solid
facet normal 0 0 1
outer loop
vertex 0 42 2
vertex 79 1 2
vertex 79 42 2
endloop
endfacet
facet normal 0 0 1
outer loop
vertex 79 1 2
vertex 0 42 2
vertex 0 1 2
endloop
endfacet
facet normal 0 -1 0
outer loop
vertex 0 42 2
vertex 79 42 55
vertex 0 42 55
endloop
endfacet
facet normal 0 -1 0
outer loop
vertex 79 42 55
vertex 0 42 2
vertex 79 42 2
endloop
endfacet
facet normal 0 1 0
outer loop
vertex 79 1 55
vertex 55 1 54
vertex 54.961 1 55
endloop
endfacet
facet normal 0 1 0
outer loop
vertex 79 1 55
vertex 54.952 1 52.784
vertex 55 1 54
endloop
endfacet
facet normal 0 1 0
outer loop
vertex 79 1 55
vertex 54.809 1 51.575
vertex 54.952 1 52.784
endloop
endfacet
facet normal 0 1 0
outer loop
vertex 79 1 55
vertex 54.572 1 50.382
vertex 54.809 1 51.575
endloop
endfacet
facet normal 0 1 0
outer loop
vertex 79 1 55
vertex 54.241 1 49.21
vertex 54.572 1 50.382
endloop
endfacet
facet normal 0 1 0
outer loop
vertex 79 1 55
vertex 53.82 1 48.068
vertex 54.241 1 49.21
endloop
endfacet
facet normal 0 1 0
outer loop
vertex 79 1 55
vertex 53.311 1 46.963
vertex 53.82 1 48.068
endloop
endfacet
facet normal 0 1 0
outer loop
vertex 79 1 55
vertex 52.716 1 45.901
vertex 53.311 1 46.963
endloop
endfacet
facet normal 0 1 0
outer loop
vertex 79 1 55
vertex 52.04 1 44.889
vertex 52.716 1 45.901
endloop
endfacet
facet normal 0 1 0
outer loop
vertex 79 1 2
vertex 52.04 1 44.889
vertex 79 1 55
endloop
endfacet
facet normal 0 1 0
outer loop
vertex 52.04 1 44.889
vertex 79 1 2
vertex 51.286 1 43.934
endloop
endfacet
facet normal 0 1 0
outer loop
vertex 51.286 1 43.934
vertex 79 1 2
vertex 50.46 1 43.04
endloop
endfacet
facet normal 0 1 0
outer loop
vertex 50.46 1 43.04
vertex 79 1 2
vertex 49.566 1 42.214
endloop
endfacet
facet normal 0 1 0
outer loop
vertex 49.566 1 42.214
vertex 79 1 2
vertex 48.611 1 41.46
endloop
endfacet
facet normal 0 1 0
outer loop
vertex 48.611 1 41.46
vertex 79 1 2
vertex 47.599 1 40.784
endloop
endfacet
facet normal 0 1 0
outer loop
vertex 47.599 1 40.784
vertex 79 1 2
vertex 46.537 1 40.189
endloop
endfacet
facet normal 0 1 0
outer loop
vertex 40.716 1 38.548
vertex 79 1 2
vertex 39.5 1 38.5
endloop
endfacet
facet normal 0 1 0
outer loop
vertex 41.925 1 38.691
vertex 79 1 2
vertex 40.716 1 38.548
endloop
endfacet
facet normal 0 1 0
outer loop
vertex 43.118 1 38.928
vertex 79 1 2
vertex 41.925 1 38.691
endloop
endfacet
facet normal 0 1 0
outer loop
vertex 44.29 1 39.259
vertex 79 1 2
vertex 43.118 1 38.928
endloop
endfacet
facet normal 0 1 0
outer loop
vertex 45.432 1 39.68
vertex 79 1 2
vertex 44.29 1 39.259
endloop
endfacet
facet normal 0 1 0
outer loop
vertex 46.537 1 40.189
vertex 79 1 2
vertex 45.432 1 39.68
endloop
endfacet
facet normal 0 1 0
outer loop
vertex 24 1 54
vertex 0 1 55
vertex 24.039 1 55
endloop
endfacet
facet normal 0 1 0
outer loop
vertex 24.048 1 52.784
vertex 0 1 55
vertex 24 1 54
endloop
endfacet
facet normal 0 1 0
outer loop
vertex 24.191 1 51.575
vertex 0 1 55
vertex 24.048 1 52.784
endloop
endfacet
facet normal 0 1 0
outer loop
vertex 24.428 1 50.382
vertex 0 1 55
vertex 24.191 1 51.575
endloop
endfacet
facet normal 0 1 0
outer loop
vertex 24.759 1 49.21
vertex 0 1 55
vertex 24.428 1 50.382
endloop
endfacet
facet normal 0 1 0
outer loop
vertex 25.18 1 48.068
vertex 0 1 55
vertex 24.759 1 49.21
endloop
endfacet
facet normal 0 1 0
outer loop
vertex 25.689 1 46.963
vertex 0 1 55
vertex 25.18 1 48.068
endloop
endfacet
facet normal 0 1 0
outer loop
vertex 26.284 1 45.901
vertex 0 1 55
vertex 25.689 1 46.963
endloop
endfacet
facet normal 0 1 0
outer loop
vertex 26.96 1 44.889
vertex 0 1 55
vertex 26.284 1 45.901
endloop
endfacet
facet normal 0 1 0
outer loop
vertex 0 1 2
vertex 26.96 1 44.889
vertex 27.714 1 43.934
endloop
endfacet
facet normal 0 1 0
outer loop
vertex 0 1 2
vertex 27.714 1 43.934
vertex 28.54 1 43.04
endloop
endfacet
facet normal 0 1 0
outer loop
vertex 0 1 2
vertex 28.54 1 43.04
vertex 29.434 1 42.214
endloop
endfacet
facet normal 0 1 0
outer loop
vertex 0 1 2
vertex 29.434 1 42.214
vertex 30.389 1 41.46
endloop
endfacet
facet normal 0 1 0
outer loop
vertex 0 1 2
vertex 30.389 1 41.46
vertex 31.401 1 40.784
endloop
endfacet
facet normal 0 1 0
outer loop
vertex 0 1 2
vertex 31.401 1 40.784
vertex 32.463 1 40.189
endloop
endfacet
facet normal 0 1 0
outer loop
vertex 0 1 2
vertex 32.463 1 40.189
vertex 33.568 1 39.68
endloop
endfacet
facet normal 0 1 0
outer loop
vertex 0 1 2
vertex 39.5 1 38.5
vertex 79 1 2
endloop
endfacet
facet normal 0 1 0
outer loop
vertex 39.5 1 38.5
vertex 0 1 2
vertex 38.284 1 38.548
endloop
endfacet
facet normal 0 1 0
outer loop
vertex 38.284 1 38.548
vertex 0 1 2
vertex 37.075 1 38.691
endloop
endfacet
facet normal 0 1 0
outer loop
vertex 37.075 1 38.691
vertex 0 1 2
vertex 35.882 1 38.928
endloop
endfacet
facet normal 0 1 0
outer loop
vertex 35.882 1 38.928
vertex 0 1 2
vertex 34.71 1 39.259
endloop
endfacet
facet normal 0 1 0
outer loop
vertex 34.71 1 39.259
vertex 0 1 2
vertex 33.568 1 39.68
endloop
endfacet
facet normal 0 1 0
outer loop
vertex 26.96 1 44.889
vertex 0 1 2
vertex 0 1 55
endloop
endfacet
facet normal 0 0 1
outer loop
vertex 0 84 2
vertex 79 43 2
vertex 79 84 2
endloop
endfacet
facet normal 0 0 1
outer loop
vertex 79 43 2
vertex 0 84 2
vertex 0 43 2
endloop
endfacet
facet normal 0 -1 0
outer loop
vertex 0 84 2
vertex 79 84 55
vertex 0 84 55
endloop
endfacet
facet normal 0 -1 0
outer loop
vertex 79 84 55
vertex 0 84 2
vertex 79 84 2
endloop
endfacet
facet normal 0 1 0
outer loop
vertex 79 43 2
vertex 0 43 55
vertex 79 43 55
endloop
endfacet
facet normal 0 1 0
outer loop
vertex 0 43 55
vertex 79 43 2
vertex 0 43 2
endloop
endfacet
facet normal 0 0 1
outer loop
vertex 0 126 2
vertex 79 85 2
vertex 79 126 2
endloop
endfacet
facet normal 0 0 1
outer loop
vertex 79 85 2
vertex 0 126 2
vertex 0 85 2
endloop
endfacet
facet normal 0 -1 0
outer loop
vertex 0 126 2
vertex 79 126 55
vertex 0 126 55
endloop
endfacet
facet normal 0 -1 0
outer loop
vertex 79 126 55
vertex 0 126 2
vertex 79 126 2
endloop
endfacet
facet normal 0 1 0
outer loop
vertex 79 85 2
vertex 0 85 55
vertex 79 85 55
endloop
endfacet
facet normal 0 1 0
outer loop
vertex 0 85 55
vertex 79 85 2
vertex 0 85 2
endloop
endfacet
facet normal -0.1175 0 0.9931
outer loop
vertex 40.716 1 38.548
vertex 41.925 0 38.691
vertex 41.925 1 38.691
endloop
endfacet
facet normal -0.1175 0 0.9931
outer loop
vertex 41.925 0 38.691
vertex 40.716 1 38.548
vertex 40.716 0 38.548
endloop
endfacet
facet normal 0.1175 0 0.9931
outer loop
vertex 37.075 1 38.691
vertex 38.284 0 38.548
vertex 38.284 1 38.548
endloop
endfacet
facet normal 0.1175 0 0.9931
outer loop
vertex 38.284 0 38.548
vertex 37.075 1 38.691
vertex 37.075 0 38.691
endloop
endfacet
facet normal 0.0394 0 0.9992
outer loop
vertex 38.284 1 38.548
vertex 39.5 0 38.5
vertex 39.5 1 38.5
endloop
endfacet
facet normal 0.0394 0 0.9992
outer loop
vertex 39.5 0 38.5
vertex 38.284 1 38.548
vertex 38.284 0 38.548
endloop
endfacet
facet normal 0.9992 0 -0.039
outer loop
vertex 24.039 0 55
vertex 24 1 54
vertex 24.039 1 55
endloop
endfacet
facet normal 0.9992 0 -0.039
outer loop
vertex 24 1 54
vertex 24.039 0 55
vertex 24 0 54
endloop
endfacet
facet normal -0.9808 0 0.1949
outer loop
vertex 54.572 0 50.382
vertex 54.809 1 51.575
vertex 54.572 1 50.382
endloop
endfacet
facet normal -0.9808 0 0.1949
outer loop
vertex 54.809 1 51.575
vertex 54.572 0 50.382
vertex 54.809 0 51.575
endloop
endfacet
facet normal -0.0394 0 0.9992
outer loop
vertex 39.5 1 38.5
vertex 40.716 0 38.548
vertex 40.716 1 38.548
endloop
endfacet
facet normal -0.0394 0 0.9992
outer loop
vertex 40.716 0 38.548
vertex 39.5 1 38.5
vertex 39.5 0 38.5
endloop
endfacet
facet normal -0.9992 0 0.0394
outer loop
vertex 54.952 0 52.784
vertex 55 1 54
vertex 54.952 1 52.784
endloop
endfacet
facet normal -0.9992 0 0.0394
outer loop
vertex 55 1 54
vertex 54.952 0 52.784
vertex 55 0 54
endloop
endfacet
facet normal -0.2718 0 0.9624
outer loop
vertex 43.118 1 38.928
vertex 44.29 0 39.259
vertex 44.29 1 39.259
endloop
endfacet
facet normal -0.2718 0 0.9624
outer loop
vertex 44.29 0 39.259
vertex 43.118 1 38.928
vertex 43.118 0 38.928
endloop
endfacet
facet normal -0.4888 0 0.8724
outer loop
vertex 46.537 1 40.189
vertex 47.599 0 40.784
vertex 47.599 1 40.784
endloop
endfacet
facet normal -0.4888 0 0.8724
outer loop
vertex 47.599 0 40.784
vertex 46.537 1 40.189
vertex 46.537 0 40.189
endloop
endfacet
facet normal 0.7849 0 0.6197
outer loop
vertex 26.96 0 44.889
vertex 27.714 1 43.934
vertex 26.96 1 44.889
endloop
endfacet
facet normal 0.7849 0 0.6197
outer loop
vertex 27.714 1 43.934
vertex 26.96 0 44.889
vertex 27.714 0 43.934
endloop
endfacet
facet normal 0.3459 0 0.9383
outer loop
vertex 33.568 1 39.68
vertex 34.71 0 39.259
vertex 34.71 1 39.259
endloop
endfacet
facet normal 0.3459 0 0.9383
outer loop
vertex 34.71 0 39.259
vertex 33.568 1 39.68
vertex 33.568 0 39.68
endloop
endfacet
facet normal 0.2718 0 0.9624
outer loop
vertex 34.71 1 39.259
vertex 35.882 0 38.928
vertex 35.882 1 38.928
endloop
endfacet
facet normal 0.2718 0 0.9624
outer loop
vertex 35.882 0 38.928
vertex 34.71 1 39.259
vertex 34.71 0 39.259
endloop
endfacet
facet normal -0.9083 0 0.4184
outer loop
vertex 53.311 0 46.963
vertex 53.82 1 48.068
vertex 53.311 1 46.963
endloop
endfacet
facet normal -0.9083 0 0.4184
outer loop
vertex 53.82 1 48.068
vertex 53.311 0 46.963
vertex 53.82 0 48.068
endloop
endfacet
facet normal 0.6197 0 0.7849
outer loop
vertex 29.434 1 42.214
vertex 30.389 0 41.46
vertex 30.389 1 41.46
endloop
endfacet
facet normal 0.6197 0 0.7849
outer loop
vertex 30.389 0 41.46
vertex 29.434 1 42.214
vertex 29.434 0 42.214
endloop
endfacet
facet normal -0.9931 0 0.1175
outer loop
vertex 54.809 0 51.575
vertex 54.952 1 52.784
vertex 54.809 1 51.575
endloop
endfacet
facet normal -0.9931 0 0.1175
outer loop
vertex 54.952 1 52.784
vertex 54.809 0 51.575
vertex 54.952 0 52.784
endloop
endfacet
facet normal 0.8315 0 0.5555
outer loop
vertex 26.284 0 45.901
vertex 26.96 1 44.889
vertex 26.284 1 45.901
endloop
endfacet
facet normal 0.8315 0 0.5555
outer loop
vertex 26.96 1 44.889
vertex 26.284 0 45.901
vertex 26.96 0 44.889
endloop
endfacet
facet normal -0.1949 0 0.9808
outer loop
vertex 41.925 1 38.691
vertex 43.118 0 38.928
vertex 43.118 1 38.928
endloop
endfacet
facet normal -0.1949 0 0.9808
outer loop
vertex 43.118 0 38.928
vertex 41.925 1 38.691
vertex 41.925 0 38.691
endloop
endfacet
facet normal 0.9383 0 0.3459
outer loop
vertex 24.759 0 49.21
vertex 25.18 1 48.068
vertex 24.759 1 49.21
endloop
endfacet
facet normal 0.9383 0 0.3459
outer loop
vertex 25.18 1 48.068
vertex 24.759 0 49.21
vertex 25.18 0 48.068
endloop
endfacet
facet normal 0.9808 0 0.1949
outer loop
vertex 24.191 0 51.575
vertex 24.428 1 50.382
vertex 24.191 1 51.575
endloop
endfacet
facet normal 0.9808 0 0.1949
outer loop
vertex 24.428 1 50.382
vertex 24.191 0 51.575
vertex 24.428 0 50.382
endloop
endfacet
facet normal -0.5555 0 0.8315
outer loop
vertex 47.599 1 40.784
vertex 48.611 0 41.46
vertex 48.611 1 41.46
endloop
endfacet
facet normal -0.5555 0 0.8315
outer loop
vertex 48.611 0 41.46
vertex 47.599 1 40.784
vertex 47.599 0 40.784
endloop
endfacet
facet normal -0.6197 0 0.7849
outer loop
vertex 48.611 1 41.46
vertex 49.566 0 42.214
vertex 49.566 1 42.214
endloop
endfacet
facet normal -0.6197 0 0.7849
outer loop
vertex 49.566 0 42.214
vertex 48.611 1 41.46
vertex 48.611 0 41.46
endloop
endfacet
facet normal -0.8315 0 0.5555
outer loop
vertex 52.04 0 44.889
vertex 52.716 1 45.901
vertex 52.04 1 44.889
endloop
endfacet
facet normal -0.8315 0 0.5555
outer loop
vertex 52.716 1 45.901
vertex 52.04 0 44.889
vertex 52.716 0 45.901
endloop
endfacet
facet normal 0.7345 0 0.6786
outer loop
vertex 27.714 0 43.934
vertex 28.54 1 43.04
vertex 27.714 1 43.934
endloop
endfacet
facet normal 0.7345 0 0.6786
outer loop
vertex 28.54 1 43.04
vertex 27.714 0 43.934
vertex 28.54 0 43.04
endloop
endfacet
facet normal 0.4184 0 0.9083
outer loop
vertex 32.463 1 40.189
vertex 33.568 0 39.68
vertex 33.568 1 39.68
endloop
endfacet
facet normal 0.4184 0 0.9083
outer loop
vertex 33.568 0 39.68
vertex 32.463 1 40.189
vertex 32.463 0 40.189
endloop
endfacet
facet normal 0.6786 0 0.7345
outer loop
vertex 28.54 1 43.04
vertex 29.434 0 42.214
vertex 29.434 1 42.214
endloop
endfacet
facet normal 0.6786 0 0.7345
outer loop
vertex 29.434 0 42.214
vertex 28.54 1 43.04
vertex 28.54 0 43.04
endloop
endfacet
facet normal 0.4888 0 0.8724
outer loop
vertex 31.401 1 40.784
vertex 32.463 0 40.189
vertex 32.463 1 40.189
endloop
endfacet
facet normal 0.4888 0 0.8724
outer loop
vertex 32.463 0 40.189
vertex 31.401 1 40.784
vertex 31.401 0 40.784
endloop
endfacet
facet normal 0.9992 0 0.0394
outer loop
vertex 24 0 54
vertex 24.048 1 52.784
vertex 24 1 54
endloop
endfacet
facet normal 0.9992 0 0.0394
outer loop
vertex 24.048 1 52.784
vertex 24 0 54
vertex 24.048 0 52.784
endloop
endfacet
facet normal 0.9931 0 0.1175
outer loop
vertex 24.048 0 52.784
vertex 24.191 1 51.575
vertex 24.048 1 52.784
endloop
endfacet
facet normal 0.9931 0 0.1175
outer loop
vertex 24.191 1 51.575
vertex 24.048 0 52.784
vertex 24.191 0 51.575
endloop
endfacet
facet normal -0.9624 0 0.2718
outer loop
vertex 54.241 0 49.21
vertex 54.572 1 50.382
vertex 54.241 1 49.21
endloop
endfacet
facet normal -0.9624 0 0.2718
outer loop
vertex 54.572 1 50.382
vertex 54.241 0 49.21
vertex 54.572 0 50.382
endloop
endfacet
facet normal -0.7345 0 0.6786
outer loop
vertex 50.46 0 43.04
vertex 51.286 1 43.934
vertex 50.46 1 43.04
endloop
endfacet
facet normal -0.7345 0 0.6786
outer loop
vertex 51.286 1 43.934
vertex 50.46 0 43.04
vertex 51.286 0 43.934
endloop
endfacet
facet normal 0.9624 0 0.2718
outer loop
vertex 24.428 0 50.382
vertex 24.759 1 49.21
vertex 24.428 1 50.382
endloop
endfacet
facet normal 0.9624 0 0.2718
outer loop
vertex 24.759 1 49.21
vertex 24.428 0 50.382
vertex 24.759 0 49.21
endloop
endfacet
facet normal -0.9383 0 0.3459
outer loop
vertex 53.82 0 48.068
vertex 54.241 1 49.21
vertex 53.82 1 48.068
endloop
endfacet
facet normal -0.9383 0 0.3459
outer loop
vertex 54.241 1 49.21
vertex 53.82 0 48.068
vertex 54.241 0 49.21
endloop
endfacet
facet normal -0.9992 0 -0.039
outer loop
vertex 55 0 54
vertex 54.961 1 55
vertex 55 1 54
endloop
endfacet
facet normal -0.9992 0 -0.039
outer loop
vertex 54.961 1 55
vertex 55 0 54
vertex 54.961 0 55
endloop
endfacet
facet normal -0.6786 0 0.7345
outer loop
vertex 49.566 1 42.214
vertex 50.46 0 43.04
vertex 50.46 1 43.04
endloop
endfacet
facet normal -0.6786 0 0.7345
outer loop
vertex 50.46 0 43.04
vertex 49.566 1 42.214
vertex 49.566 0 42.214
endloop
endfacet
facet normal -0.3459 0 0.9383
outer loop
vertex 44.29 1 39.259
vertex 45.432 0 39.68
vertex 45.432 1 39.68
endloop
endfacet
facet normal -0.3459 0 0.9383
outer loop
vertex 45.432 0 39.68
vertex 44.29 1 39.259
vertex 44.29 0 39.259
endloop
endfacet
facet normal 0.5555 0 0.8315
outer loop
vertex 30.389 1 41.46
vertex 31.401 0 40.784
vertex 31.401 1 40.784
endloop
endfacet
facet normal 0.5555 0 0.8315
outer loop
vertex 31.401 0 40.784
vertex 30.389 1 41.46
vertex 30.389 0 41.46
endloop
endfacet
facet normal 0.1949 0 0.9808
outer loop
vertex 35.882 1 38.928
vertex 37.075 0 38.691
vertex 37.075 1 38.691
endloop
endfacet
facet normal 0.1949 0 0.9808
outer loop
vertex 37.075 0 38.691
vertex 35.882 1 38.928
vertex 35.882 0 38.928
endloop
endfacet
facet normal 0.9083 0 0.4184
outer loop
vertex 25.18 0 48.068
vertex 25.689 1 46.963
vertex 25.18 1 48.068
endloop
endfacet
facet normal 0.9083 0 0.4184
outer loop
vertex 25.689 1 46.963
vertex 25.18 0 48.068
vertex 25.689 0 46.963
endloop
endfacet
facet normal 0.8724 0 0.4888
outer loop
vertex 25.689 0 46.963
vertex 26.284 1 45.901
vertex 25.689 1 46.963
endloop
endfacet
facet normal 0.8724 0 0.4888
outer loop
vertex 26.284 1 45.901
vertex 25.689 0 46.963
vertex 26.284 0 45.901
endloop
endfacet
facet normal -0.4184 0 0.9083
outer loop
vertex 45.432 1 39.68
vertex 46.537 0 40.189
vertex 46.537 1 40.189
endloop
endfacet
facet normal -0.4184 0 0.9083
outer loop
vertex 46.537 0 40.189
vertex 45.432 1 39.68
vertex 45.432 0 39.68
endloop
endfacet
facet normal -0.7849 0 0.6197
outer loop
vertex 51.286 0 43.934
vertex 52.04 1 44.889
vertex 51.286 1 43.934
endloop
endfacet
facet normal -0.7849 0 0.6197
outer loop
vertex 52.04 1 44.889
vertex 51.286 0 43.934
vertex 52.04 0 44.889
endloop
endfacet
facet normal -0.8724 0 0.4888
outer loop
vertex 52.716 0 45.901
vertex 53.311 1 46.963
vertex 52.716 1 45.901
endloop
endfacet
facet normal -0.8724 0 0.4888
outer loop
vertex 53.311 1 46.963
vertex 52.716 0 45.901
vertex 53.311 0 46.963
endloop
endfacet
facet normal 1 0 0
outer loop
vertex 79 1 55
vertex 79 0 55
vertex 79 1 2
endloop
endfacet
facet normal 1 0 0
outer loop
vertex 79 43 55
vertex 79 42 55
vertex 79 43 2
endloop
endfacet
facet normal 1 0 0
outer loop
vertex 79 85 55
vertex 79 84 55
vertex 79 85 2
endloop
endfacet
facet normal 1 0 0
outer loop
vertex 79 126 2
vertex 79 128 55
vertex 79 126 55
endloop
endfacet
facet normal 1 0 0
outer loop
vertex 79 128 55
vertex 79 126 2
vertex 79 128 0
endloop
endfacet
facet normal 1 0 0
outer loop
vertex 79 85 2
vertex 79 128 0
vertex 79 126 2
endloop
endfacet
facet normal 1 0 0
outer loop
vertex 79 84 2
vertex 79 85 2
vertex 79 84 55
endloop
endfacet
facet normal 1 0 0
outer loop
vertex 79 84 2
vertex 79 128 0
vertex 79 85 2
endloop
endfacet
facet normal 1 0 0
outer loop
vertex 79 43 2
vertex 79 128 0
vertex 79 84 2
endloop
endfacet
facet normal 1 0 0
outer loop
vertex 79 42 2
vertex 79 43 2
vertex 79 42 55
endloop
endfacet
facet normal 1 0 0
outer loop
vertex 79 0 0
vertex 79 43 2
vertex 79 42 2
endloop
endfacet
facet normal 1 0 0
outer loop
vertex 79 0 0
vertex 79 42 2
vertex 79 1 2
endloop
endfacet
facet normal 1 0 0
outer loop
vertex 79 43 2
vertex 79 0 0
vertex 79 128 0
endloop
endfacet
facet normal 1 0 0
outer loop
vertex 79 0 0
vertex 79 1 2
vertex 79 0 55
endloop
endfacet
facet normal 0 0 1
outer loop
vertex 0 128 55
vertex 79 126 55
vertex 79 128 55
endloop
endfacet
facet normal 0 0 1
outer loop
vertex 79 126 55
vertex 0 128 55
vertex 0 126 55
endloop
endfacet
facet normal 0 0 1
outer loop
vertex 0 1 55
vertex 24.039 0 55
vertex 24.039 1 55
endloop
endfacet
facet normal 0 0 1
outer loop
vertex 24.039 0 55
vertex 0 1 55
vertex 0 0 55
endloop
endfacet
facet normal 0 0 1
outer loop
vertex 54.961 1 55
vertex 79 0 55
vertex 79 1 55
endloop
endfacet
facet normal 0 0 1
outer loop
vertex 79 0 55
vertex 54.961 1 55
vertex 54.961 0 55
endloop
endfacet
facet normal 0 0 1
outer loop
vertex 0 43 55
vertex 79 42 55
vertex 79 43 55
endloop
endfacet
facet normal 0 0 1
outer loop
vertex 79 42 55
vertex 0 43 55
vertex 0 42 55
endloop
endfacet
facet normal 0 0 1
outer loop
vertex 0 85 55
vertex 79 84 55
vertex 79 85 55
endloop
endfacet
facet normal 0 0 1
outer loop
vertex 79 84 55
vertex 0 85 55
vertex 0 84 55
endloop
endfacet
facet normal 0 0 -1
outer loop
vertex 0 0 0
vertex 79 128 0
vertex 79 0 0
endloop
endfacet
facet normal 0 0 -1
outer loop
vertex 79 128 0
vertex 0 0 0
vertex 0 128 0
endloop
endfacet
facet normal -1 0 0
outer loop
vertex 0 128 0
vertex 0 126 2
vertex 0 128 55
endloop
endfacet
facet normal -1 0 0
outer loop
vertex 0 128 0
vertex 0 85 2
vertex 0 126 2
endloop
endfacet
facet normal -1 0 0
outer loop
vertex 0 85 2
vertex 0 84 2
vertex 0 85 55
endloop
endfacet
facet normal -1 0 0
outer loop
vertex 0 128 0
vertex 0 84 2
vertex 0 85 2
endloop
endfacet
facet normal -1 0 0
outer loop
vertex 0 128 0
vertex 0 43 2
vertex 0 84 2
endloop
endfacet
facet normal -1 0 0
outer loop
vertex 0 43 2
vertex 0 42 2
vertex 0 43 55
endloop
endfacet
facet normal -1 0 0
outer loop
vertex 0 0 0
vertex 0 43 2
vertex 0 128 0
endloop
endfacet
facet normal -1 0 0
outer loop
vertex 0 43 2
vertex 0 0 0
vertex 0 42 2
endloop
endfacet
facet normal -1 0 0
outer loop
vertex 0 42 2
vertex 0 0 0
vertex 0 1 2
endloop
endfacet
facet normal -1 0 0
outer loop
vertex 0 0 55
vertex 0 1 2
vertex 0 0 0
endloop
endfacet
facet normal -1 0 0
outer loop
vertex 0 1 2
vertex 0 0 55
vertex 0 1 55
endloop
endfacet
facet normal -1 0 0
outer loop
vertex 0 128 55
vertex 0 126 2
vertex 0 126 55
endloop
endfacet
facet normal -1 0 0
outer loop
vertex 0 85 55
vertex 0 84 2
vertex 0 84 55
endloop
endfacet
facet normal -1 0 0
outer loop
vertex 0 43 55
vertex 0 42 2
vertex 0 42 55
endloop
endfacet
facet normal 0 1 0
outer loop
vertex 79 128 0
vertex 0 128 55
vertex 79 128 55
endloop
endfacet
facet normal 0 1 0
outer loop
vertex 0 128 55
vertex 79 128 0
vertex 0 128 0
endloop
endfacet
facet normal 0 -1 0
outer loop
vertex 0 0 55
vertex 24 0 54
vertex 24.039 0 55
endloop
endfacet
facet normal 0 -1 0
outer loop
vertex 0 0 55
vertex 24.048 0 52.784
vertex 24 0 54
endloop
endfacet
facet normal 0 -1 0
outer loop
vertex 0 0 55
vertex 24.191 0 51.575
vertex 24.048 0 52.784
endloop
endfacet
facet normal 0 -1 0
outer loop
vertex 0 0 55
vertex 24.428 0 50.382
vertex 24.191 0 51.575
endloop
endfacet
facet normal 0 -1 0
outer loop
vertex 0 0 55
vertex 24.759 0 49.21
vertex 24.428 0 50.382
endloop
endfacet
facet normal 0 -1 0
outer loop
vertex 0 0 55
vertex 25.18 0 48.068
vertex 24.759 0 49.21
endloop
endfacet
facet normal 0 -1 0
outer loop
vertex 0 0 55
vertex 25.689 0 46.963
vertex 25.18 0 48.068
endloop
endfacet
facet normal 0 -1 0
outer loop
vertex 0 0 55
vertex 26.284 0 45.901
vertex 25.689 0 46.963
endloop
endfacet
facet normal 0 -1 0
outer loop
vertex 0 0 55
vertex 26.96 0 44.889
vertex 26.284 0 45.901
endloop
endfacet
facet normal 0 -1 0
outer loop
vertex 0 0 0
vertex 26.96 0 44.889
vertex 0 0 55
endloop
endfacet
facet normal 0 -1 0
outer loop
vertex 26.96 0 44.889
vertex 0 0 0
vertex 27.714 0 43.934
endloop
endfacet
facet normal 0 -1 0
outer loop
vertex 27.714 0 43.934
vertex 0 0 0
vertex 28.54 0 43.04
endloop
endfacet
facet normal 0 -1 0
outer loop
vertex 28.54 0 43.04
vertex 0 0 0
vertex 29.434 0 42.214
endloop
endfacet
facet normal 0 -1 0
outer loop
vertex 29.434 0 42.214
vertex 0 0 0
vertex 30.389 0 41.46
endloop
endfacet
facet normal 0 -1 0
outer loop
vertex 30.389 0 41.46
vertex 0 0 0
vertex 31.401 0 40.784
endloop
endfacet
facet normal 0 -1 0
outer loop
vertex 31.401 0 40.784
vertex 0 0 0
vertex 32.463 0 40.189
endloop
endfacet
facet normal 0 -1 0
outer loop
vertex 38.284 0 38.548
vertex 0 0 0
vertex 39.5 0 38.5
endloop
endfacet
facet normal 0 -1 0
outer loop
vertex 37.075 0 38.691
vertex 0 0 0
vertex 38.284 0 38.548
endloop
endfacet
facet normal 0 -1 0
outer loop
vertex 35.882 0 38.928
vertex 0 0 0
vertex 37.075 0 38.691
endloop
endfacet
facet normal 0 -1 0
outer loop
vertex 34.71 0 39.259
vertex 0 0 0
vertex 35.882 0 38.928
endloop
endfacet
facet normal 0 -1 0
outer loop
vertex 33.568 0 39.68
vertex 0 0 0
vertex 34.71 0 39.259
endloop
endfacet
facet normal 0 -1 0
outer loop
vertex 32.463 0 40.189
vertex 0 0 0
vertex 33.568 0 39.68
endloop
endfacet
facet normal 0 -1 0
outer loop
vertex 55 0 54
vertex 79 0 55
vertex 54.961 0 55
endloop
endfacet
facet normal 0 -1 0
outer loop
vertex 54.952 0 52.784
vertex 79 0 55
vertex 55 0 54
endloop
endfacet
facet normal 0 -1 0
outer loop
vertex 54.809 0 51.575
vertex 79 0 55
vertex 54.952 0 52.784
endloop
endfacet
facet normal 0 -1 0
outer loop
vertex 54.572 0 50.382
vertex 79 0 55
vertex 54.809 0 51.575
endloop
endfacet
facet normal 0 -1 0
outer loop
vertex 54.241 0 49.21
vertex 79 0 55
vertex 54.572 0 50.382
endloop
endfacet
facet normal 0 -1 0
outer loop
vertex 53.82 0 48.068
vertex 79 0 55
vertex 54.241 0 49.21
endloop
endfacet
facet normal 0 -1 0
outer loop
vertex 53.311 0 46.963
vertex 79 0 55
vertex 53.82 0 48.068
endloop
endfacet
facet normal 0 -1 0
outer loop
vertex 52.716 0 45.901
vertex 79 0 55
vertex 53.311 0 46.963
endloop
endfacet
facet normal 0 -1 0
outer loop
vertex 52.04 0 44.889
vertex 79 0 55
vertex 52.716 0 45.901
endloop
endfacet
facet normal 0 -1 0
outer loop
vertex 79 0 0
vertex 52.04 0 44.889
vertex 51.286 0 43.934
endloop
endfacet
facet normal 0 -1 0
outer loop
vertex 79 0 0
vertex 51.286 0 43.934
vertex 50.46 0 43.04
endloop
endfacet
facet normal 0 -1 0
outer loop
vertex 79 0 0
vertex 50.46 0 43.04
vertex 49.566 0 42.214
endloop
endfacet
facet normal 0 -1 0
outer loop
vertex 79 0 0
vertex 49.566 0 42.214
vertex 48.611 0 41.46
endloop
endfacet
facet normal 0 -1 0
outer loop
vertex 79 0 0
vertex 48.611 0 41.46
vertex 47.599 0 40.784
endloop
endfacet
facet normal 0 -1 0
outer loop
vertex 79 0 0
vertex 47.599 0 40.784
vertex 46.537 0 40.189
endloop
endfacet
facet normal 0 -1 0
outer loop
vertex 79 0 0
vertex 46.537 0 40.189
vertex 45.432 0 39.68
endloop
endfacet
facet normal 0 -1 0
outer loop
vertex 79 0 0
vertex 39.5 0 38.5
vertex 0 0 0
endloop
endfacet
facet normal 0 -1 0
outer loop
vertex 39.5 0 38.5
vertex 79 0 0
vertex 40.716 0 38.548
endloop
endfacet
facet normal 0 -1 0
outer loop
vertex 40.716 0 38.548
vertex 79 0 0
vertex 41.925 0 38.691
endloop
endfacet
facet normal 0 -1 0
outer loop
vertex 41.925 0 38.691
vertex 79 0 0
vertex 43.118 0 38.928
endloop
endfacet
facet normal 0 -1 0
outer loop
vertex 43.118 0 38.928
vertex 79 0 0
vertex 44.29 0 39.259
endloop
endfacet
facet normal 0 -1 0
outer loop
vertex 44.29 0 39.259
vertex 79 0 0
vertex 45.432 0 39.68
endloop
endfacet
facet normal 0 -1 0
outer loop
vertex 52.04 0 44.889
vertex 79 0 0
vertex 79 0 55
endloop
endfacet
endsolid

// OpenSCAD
/*
 * © 2021 Louis Kowolowski
 *
 * Insert for small hobbyzone drawer to hold pe tools like saws, umm scribers,
 * and misc bits
 */
difference () {
	// whole insert as a cube
	color ("grey") cube ([79, 128, 55]);

	union () {
		// Bulk storage area
		translate ([-1, 1, 2]) {
			color ("grey") cube ([81, 41, 54]);
		}

		translate ([-1, 43, 2]) {
			color ("grey") cube ([81, 41, 54]);
		}

		translate ([-1, 85, 2]) {
			color ("grey") cube ([81, 41, 54]);
		}

		translate ([39.5, -1, 54]) {
			rotate ([0, 90, 90]) {
				cylinder (5, d=31, $fn=80, true);
			}
		}
	}
}
